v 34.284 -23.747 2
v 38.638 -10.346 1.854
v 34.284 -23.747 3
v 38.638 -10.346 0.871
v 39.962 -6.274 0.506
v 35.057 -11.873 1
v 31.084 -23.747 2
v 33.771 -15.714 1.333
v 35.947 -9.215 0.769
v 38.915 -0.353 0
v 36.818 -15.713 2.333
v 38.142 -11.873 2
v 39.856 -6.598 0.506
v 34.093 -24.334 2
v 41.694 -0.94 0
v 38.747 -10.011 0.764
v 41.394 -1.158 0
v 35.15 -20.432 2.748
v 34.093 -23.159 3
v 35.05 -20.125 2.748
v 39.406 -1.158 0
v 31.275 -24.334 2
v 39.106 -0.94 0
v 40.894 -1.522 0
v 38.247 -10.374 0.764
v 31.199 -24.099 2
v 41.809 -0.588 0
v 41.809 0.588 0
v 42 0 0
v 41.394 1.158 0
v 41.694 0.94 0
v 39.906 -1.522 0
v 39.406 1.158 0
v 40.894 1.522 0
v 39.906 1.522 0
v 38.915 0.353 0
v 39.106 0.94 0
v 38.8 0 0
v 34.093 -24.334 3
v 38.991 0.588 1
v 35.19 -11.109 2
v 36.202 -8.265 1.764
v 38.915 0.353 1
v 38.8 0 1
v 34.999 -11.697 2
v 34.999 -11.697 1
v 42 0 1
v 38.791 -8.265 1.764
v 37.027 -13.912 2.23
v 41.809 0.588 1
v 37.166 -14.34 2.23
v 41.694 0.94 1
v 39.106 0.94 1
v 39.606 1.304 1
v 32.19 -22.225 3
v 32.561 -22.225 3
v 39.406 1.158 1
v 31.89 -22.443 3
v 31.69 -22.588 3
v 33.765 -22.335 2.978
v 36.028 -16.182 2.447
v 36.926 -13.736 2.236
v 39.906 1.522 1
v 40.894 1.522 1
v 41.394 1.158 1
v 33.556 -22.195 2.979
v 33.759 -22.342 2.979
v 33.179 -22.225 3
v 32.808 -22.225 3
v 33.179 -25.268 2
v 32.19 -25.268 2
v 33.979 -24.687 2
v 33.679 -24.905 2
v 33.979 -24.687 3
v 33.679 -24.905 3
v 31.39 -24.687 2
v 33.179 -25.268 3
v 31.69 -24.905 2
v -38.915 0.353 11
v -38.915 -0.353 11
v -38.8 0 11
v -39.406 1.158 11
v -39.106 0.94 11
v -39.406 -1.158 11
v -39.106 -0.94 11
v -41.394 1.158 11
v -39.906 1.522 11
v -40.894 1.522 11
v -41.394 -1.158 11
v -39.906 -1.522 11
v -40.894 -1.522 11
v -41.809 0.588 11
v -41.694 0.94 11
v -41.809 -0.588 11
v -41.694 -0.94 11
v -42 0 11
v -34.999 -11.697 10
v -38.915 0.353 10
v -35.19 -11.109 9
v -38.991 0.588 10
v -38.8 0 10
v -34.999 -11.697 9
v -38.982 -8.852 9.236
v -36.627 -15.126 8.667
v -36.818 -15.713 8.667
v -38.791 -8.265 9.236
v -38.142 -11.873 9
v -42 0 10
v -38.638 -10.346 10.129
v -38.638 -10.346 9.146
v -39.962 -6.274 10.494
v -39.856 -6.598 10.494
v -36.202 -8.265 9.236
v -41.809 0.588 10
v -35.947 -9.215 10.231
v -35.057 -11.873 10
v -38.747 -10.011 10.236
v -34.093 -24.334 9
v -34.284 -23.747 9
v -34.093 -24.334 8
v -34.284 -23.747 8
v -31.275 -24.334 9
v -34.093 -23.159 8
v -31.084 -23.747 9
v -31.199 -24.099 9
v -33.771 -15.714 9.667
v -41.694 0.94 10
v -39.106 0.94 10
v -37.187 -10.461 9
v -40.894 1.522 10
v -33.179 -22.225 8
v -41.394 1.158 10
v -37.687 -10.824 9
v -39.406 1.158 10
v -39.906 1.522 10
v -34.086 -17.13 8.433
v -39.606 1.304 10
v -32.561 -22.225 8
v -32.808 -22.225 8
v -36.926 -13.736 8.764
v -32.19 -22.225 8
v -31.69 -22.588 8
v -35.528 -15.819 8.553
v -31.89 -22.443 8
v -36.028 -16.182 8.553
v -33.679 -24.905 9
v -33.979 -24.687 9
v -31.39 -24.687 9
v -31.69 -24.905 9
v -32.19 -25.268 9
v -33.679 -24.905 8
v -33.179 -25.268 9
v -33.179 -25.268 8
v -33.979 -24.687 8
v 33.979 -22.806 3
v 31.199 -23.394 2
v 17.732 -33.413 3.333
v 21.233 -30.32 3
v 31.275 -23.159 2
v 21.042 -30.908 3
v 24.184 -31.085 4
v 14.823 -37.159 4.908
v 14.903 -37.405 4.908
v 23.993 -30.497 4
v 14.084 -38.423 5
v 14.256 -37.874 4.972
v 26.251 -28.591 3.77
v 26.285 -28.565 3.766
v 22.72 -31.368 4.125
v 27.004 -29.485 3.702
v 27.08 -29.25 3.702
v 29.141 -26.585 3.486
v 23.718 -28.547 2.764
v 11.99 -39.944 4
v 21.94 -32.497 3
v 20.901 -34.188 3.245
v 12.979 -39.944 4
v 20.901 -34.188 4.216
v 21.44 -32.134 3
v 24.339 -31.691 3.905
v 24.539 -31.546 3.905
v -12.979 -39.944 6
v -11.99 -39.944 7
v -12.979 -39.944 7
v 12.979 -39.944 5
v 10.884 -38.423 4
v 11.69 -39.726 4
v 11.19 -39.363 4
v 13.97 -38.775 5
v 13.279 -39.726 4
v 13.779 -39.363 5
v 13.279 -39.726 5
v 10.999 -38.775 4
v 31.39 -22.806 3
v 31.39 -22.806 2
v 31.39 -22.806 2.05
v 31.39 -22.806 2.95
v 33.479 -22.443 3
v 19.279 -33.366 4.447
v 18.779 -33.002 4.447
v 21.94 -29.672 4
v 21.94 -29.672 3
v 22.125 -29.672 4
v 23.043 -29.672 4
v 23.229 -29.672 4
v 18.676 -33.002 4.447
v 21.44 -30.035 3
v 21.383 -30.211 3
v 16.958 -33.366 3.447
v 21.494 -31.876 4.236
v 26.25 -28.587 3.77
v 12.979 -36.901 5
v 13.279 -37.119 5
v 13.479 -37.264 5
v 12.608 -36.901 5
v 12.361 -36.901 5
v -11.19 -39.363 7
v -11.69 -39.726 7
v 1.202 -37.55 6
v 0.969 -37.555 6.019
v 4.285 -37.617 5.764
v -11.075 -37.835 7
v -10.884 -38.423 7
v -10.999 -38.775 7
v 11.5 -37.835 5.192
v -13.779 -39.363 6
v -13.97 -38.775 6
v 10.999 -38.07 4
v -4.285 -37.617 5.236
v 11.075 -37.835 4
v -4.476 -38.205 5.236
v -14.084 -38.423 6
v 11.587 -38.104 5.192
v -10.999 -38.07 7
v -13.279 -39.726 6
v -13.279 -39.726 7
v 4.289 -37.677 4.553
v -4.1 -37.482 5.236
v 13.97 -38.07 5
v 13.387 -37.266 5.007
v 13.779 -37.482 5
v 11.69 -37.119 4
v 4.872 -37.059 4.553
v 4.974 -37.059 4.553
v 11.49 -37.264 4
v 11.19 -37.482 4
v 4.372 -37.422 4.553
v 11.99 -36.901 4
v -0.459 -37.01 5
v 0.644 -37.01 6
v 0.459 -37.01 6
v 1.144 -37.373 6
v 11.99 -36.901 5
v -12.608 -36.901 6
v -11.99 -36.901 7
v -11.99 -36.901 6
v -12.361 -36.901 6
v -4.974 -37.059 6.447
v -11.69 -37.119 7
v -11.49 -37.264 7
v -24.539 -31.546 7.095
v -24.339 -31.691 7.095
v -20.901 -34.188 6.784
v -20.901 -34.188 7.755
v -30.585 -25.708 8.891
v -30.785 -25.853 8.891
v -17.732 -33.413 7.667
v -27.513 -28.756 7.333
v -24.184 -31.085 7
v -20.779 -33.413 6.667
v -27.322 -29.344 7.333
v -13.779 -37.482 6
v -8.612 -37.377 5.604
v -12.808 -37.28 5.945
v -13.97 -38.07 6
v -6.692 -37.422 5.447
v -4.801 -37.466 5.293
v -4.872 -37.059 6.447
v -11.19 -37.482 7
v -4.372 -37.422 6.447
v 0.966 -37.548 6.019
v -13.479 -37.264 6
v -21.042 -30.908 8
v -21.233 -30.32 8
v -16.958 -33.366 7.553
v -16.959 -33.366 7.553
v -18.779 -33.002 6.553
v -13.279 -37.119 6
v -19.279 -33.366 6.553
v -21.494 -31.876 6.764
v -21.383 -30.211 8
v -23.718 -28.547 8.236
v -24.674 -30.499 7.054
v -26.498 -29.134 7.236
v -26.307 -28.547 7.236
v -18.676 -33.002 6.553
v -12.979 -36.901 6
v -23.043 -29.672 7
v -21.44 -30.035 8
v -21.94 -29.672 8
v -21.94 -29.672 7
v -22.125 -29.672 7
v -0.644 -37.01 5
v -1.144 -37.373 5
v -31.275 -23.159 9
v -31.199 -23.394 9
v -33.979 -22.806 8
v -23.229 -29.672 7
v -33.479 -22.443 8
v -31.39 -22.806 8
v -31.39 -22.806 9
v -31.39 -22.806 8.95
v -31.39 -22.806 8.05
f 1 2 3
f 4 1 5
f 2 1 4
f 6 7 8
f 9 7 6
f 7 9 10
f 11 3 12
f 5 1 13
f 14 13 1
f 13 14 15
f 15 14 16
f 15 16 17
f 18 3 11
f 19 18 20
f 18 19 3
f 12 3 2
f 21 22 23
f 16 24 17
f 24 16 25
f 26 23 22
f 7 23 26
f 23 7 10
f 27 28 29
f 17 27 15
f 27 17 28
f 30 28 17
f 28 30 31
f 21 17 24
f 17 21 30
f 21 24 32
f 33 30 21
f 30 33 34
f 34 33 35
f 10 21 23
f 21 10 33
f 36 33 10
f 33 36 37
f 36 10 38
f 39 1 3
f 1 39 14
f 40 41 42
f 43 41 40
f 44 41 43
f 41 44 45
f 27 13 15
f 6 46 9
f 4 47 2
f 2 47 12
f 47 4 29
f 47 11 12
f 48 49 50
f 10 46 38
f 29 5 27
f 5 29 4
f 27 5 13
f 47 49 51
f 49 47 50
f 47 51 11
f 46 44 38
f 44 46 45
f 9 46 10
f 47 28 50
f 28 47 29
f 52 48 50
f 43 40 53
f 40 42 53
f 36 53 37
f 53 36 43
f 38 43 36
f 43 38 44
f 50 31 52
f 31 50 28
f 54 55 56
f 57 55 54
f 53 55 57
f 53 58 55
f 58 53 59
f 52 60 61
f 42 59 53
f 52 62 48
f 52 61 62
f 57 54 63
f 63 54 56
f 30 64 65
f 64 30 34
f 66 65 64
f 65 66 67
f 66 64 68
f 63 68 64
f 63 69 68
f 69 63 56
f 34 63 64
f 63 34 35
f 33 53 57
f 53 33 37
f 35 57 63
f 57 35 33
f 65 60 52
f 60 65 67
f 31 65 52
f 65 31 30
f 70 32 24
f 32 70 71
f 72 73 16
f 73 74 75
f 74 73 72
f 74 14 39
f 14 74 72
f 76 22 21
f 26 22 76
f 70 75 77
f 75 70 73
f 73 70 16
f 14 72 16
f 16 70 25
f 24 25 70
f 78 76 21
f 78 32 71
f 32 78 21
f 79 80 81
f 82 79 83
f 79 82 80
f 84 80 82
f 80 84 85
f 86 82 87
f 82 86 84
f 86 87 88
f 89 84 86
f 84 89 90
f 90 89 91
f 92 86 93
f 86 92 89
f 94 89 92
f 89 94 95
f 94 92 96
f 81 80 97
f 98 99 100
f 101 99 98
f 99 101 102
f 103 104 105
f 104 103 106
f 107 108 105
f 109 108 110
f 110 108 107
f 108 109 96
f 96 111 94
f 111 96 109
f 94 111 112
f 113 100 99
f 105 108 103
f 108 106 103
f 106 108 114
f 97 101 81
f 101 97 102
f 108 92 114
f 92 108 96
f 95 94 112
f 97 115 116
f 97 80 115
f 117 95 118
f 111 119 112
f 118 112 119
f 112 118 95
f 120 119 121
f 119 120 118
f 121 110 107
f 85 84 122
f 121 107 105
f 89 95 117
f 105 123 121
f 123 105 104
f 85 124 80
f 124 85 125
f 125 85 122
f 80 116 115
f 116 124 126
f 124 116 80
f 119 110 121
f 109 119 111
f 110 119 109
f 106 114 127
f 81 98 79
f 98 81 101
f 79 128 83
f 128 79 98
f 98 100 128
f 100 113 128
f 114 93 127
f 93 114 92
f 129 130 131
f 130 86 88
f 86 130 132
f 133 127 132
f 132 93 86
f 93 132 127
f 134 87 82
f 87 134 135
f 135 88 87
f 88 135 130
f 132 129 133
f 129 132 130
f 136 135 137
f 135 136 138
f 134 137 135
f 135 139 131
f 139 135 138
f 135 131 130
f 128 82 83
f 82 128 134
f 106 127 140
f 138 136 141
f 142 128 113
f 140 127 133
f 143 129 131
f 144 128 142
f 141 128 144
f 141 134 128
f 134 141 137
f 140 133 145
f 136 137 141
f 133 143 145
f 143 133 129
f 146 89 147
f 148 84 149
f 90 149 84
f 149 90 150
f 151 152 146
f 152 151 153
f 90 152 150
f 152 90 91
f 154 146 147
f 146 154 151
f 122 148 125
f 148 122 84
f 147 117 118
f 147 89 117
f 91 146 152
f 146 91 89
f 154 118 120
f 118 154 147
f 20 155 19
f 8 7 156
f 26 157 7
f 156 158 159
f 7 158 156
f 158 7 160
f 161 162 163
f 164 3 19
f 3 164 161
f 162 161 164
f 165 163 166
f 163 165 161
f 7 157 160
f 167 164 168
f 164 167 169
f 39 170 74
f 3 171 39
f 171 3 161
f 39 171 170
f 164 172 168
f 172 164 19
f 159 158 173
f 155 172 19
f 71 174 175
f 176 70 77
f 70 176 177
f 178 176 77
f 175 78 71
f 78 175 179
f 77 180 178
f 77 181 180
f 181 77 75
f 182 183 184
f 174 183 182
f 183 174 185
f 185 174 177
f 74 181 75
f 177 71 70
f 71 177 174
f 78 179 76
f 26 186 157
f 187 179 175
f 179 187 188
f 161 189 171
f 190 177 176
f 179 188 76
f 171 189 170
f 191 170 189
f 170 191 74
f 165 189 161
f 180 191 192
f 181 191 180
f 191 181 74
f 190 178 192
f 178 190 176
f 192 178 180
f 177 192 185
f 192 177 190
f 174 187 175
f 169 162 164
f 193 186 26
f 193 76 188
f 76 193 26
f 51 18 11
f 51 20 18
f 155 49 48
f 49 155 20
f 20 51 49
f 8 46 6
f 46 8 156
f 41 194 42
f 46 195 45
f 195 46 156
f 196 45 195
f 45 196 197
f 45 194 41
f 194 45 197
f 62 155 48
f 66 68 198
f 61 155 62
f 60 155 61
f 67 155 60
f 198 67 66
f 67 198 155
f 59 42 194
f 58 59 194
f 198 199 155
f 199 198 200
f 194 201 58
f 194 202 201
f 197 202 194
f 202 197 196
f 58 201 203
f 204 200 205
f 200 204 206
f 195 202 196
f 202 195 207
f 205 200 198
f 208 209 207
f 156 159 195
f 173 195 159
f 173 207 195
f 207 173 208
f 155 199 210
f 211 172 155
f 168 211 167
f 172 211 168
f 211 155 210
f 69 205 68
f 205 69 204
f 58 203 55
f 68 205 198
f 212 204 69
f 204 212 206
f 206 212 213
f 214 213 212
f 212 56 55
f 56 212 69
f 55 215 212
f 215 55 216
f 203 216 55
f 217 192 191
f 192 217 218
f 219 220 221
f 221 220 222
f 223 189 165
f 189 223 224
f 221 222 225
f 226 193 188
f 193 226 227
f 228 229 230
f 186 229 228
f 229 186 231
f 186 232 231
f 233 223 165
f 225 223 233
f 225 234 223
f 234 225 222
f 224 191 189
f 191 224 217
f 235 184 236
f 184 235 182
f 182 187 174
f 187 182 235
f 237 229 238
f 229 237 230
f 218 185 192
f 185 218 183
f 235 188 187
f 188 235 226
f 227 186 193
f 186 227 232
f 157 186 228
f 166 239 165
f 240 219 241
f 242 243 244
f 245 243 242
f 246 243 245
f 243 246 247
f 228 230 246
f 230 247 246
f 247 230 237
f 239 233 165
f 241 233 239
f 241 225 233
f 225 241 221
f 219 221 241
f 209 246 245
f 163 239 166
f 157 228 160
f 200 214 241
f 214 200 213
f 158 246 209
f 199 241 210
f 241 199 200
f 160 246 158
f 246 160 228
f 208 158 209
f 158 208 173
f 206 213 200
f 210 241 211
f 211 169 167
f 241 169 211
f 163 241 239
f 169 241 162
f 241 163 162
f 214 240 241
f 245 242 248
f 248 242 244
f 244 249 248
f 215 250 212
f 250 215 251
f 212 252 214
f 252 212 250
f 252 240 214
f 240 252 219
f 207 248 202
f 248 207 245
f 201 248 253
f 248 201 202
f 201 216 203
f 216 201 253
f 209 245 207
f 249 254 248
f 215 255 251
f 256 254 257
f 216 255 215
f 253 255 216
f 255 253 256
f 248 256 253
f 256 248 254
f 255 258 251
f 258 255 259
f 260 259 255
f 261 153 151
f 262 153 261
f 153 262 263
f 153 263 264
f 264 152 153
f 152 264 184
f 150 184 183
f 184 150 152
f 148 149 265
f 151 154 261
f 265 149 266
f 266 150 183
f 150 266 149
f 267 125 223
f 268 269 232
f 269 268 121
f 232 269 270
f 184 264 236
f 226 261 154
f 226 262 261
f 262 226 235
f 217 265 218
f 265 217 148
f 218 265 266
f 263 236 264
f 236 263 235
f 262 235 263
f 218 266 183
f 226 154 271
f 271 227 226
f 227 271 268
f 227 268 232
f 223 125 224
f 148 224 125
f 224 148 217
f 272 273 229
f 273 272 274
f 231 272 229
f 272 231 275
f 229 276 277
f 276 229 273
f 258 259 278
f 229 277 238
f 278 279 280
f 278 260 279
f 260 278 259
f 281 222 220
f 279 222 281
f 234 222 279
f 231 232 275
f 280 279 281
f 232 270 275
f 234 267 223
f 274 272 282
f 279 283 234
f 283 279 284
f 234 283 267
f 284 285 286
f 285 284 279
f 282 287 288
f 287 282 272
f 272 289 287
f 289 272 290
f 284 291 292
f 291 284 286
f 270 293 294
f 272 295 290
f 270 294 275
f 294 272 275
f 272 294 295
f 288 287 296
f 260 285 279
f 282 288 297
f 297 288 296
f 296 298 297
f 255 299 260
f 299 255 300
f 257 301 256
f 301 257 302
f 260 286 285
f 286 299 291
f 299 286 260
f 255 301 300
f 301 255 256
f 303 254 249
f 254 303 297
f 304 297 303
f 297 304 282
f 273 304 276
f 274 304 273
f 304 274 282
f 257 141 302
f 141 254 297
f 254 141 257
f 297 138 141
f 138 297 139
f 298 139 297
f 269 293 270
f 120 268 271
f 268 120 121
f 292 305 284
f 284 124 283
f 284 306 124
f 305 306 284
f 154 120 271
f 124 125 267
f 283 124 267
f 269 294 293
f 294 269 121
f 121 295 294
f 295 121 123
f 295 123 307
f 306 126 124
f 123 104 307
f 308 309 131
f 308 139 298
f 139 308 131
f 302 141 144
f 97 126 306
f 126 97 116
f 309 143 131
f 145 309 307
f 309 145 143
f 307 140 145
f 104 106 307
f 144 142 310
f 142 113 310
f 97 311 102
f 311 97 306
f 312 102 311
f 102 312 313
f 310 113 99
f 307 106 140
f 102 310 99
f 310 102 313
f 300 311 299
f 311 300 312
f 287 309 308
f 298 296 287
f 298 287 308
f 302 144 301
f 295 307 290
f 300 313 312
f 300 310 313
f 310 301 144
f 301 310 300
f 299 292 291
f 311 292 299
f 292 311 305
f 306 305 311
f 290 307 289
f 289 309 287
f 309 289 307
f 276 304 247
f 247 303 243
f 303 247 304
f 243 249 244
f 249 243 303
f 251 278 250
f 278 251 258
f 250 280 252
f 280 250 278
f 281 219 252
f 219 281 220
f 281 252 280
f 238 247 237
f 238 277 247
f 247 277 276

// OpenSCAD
Diametro=90;
espesor=4;
//pasoRosca=0.6;
espesorRosca=1;

//compartimiento1=80;
//compartimiento2=95;
alturasRosca=10;
resoluciOn=10;
radioRosca=0.6;
vueltas=0.5;


minkowski(){
    //union(){
            linear_extrude(height = alturasRosca, center = false, convexity = 10, twist = 360*0.5, $fn = resoluciOn)
       translate([Diametro/2-espesor-radioRosca, 0, 0])
    circle(r = radioRosca);
    //}
    cylinder(r=1,h=1,$fn=resoluciOn);  
}

/*
difference(){
    
hull(){
    union(){
linear_extrude(height = alturasRosca, center = false, convexity = 10, twist = 360*0.5, $fn = resoluciOn)
translate([Diametro/2-espesor-radioRosca, 0, 0])
circle(r = radioRosca);
    }
    translate([0,0,espesorRosca])
    union(){
    linear_extrude(height = alturasRosca, center = false, convexity = 10, twist = 360*0.5, $fn = resoluciOn)
translate([Diametro/2-espesor-radioRosca, 0, 0])
circle(r = radioRosca);
    }
    
}

cylinder(r=Diametro/2-espesor*4,$fn=100,h=alturasRosca*2);
}


difference(){
    
hull(){
    union(){
linear_extrude(height = alturasRosca, center = false, convexity = 10, twist = 360*0.5, $fn = resoluciOn)
translate([Diametro/2-espesor-radioRosca, 0, 0])
circle(r = radioRosca);
    }
    translate([0,0,espesorRosca])
    union(){
    linear_extrude(height = alturasRosca, center = false, convexity = 10, twist = 360*0.5, $fn = resoluciOn)
translate([Diametro/2-espesor-radioRosca, 0, 0])
circle(r = radioRosca);
    }
    
}

cylinder(r=Diametro/2-espesor*4,$fn=100,h=alturasRosca*2);
}
*/
